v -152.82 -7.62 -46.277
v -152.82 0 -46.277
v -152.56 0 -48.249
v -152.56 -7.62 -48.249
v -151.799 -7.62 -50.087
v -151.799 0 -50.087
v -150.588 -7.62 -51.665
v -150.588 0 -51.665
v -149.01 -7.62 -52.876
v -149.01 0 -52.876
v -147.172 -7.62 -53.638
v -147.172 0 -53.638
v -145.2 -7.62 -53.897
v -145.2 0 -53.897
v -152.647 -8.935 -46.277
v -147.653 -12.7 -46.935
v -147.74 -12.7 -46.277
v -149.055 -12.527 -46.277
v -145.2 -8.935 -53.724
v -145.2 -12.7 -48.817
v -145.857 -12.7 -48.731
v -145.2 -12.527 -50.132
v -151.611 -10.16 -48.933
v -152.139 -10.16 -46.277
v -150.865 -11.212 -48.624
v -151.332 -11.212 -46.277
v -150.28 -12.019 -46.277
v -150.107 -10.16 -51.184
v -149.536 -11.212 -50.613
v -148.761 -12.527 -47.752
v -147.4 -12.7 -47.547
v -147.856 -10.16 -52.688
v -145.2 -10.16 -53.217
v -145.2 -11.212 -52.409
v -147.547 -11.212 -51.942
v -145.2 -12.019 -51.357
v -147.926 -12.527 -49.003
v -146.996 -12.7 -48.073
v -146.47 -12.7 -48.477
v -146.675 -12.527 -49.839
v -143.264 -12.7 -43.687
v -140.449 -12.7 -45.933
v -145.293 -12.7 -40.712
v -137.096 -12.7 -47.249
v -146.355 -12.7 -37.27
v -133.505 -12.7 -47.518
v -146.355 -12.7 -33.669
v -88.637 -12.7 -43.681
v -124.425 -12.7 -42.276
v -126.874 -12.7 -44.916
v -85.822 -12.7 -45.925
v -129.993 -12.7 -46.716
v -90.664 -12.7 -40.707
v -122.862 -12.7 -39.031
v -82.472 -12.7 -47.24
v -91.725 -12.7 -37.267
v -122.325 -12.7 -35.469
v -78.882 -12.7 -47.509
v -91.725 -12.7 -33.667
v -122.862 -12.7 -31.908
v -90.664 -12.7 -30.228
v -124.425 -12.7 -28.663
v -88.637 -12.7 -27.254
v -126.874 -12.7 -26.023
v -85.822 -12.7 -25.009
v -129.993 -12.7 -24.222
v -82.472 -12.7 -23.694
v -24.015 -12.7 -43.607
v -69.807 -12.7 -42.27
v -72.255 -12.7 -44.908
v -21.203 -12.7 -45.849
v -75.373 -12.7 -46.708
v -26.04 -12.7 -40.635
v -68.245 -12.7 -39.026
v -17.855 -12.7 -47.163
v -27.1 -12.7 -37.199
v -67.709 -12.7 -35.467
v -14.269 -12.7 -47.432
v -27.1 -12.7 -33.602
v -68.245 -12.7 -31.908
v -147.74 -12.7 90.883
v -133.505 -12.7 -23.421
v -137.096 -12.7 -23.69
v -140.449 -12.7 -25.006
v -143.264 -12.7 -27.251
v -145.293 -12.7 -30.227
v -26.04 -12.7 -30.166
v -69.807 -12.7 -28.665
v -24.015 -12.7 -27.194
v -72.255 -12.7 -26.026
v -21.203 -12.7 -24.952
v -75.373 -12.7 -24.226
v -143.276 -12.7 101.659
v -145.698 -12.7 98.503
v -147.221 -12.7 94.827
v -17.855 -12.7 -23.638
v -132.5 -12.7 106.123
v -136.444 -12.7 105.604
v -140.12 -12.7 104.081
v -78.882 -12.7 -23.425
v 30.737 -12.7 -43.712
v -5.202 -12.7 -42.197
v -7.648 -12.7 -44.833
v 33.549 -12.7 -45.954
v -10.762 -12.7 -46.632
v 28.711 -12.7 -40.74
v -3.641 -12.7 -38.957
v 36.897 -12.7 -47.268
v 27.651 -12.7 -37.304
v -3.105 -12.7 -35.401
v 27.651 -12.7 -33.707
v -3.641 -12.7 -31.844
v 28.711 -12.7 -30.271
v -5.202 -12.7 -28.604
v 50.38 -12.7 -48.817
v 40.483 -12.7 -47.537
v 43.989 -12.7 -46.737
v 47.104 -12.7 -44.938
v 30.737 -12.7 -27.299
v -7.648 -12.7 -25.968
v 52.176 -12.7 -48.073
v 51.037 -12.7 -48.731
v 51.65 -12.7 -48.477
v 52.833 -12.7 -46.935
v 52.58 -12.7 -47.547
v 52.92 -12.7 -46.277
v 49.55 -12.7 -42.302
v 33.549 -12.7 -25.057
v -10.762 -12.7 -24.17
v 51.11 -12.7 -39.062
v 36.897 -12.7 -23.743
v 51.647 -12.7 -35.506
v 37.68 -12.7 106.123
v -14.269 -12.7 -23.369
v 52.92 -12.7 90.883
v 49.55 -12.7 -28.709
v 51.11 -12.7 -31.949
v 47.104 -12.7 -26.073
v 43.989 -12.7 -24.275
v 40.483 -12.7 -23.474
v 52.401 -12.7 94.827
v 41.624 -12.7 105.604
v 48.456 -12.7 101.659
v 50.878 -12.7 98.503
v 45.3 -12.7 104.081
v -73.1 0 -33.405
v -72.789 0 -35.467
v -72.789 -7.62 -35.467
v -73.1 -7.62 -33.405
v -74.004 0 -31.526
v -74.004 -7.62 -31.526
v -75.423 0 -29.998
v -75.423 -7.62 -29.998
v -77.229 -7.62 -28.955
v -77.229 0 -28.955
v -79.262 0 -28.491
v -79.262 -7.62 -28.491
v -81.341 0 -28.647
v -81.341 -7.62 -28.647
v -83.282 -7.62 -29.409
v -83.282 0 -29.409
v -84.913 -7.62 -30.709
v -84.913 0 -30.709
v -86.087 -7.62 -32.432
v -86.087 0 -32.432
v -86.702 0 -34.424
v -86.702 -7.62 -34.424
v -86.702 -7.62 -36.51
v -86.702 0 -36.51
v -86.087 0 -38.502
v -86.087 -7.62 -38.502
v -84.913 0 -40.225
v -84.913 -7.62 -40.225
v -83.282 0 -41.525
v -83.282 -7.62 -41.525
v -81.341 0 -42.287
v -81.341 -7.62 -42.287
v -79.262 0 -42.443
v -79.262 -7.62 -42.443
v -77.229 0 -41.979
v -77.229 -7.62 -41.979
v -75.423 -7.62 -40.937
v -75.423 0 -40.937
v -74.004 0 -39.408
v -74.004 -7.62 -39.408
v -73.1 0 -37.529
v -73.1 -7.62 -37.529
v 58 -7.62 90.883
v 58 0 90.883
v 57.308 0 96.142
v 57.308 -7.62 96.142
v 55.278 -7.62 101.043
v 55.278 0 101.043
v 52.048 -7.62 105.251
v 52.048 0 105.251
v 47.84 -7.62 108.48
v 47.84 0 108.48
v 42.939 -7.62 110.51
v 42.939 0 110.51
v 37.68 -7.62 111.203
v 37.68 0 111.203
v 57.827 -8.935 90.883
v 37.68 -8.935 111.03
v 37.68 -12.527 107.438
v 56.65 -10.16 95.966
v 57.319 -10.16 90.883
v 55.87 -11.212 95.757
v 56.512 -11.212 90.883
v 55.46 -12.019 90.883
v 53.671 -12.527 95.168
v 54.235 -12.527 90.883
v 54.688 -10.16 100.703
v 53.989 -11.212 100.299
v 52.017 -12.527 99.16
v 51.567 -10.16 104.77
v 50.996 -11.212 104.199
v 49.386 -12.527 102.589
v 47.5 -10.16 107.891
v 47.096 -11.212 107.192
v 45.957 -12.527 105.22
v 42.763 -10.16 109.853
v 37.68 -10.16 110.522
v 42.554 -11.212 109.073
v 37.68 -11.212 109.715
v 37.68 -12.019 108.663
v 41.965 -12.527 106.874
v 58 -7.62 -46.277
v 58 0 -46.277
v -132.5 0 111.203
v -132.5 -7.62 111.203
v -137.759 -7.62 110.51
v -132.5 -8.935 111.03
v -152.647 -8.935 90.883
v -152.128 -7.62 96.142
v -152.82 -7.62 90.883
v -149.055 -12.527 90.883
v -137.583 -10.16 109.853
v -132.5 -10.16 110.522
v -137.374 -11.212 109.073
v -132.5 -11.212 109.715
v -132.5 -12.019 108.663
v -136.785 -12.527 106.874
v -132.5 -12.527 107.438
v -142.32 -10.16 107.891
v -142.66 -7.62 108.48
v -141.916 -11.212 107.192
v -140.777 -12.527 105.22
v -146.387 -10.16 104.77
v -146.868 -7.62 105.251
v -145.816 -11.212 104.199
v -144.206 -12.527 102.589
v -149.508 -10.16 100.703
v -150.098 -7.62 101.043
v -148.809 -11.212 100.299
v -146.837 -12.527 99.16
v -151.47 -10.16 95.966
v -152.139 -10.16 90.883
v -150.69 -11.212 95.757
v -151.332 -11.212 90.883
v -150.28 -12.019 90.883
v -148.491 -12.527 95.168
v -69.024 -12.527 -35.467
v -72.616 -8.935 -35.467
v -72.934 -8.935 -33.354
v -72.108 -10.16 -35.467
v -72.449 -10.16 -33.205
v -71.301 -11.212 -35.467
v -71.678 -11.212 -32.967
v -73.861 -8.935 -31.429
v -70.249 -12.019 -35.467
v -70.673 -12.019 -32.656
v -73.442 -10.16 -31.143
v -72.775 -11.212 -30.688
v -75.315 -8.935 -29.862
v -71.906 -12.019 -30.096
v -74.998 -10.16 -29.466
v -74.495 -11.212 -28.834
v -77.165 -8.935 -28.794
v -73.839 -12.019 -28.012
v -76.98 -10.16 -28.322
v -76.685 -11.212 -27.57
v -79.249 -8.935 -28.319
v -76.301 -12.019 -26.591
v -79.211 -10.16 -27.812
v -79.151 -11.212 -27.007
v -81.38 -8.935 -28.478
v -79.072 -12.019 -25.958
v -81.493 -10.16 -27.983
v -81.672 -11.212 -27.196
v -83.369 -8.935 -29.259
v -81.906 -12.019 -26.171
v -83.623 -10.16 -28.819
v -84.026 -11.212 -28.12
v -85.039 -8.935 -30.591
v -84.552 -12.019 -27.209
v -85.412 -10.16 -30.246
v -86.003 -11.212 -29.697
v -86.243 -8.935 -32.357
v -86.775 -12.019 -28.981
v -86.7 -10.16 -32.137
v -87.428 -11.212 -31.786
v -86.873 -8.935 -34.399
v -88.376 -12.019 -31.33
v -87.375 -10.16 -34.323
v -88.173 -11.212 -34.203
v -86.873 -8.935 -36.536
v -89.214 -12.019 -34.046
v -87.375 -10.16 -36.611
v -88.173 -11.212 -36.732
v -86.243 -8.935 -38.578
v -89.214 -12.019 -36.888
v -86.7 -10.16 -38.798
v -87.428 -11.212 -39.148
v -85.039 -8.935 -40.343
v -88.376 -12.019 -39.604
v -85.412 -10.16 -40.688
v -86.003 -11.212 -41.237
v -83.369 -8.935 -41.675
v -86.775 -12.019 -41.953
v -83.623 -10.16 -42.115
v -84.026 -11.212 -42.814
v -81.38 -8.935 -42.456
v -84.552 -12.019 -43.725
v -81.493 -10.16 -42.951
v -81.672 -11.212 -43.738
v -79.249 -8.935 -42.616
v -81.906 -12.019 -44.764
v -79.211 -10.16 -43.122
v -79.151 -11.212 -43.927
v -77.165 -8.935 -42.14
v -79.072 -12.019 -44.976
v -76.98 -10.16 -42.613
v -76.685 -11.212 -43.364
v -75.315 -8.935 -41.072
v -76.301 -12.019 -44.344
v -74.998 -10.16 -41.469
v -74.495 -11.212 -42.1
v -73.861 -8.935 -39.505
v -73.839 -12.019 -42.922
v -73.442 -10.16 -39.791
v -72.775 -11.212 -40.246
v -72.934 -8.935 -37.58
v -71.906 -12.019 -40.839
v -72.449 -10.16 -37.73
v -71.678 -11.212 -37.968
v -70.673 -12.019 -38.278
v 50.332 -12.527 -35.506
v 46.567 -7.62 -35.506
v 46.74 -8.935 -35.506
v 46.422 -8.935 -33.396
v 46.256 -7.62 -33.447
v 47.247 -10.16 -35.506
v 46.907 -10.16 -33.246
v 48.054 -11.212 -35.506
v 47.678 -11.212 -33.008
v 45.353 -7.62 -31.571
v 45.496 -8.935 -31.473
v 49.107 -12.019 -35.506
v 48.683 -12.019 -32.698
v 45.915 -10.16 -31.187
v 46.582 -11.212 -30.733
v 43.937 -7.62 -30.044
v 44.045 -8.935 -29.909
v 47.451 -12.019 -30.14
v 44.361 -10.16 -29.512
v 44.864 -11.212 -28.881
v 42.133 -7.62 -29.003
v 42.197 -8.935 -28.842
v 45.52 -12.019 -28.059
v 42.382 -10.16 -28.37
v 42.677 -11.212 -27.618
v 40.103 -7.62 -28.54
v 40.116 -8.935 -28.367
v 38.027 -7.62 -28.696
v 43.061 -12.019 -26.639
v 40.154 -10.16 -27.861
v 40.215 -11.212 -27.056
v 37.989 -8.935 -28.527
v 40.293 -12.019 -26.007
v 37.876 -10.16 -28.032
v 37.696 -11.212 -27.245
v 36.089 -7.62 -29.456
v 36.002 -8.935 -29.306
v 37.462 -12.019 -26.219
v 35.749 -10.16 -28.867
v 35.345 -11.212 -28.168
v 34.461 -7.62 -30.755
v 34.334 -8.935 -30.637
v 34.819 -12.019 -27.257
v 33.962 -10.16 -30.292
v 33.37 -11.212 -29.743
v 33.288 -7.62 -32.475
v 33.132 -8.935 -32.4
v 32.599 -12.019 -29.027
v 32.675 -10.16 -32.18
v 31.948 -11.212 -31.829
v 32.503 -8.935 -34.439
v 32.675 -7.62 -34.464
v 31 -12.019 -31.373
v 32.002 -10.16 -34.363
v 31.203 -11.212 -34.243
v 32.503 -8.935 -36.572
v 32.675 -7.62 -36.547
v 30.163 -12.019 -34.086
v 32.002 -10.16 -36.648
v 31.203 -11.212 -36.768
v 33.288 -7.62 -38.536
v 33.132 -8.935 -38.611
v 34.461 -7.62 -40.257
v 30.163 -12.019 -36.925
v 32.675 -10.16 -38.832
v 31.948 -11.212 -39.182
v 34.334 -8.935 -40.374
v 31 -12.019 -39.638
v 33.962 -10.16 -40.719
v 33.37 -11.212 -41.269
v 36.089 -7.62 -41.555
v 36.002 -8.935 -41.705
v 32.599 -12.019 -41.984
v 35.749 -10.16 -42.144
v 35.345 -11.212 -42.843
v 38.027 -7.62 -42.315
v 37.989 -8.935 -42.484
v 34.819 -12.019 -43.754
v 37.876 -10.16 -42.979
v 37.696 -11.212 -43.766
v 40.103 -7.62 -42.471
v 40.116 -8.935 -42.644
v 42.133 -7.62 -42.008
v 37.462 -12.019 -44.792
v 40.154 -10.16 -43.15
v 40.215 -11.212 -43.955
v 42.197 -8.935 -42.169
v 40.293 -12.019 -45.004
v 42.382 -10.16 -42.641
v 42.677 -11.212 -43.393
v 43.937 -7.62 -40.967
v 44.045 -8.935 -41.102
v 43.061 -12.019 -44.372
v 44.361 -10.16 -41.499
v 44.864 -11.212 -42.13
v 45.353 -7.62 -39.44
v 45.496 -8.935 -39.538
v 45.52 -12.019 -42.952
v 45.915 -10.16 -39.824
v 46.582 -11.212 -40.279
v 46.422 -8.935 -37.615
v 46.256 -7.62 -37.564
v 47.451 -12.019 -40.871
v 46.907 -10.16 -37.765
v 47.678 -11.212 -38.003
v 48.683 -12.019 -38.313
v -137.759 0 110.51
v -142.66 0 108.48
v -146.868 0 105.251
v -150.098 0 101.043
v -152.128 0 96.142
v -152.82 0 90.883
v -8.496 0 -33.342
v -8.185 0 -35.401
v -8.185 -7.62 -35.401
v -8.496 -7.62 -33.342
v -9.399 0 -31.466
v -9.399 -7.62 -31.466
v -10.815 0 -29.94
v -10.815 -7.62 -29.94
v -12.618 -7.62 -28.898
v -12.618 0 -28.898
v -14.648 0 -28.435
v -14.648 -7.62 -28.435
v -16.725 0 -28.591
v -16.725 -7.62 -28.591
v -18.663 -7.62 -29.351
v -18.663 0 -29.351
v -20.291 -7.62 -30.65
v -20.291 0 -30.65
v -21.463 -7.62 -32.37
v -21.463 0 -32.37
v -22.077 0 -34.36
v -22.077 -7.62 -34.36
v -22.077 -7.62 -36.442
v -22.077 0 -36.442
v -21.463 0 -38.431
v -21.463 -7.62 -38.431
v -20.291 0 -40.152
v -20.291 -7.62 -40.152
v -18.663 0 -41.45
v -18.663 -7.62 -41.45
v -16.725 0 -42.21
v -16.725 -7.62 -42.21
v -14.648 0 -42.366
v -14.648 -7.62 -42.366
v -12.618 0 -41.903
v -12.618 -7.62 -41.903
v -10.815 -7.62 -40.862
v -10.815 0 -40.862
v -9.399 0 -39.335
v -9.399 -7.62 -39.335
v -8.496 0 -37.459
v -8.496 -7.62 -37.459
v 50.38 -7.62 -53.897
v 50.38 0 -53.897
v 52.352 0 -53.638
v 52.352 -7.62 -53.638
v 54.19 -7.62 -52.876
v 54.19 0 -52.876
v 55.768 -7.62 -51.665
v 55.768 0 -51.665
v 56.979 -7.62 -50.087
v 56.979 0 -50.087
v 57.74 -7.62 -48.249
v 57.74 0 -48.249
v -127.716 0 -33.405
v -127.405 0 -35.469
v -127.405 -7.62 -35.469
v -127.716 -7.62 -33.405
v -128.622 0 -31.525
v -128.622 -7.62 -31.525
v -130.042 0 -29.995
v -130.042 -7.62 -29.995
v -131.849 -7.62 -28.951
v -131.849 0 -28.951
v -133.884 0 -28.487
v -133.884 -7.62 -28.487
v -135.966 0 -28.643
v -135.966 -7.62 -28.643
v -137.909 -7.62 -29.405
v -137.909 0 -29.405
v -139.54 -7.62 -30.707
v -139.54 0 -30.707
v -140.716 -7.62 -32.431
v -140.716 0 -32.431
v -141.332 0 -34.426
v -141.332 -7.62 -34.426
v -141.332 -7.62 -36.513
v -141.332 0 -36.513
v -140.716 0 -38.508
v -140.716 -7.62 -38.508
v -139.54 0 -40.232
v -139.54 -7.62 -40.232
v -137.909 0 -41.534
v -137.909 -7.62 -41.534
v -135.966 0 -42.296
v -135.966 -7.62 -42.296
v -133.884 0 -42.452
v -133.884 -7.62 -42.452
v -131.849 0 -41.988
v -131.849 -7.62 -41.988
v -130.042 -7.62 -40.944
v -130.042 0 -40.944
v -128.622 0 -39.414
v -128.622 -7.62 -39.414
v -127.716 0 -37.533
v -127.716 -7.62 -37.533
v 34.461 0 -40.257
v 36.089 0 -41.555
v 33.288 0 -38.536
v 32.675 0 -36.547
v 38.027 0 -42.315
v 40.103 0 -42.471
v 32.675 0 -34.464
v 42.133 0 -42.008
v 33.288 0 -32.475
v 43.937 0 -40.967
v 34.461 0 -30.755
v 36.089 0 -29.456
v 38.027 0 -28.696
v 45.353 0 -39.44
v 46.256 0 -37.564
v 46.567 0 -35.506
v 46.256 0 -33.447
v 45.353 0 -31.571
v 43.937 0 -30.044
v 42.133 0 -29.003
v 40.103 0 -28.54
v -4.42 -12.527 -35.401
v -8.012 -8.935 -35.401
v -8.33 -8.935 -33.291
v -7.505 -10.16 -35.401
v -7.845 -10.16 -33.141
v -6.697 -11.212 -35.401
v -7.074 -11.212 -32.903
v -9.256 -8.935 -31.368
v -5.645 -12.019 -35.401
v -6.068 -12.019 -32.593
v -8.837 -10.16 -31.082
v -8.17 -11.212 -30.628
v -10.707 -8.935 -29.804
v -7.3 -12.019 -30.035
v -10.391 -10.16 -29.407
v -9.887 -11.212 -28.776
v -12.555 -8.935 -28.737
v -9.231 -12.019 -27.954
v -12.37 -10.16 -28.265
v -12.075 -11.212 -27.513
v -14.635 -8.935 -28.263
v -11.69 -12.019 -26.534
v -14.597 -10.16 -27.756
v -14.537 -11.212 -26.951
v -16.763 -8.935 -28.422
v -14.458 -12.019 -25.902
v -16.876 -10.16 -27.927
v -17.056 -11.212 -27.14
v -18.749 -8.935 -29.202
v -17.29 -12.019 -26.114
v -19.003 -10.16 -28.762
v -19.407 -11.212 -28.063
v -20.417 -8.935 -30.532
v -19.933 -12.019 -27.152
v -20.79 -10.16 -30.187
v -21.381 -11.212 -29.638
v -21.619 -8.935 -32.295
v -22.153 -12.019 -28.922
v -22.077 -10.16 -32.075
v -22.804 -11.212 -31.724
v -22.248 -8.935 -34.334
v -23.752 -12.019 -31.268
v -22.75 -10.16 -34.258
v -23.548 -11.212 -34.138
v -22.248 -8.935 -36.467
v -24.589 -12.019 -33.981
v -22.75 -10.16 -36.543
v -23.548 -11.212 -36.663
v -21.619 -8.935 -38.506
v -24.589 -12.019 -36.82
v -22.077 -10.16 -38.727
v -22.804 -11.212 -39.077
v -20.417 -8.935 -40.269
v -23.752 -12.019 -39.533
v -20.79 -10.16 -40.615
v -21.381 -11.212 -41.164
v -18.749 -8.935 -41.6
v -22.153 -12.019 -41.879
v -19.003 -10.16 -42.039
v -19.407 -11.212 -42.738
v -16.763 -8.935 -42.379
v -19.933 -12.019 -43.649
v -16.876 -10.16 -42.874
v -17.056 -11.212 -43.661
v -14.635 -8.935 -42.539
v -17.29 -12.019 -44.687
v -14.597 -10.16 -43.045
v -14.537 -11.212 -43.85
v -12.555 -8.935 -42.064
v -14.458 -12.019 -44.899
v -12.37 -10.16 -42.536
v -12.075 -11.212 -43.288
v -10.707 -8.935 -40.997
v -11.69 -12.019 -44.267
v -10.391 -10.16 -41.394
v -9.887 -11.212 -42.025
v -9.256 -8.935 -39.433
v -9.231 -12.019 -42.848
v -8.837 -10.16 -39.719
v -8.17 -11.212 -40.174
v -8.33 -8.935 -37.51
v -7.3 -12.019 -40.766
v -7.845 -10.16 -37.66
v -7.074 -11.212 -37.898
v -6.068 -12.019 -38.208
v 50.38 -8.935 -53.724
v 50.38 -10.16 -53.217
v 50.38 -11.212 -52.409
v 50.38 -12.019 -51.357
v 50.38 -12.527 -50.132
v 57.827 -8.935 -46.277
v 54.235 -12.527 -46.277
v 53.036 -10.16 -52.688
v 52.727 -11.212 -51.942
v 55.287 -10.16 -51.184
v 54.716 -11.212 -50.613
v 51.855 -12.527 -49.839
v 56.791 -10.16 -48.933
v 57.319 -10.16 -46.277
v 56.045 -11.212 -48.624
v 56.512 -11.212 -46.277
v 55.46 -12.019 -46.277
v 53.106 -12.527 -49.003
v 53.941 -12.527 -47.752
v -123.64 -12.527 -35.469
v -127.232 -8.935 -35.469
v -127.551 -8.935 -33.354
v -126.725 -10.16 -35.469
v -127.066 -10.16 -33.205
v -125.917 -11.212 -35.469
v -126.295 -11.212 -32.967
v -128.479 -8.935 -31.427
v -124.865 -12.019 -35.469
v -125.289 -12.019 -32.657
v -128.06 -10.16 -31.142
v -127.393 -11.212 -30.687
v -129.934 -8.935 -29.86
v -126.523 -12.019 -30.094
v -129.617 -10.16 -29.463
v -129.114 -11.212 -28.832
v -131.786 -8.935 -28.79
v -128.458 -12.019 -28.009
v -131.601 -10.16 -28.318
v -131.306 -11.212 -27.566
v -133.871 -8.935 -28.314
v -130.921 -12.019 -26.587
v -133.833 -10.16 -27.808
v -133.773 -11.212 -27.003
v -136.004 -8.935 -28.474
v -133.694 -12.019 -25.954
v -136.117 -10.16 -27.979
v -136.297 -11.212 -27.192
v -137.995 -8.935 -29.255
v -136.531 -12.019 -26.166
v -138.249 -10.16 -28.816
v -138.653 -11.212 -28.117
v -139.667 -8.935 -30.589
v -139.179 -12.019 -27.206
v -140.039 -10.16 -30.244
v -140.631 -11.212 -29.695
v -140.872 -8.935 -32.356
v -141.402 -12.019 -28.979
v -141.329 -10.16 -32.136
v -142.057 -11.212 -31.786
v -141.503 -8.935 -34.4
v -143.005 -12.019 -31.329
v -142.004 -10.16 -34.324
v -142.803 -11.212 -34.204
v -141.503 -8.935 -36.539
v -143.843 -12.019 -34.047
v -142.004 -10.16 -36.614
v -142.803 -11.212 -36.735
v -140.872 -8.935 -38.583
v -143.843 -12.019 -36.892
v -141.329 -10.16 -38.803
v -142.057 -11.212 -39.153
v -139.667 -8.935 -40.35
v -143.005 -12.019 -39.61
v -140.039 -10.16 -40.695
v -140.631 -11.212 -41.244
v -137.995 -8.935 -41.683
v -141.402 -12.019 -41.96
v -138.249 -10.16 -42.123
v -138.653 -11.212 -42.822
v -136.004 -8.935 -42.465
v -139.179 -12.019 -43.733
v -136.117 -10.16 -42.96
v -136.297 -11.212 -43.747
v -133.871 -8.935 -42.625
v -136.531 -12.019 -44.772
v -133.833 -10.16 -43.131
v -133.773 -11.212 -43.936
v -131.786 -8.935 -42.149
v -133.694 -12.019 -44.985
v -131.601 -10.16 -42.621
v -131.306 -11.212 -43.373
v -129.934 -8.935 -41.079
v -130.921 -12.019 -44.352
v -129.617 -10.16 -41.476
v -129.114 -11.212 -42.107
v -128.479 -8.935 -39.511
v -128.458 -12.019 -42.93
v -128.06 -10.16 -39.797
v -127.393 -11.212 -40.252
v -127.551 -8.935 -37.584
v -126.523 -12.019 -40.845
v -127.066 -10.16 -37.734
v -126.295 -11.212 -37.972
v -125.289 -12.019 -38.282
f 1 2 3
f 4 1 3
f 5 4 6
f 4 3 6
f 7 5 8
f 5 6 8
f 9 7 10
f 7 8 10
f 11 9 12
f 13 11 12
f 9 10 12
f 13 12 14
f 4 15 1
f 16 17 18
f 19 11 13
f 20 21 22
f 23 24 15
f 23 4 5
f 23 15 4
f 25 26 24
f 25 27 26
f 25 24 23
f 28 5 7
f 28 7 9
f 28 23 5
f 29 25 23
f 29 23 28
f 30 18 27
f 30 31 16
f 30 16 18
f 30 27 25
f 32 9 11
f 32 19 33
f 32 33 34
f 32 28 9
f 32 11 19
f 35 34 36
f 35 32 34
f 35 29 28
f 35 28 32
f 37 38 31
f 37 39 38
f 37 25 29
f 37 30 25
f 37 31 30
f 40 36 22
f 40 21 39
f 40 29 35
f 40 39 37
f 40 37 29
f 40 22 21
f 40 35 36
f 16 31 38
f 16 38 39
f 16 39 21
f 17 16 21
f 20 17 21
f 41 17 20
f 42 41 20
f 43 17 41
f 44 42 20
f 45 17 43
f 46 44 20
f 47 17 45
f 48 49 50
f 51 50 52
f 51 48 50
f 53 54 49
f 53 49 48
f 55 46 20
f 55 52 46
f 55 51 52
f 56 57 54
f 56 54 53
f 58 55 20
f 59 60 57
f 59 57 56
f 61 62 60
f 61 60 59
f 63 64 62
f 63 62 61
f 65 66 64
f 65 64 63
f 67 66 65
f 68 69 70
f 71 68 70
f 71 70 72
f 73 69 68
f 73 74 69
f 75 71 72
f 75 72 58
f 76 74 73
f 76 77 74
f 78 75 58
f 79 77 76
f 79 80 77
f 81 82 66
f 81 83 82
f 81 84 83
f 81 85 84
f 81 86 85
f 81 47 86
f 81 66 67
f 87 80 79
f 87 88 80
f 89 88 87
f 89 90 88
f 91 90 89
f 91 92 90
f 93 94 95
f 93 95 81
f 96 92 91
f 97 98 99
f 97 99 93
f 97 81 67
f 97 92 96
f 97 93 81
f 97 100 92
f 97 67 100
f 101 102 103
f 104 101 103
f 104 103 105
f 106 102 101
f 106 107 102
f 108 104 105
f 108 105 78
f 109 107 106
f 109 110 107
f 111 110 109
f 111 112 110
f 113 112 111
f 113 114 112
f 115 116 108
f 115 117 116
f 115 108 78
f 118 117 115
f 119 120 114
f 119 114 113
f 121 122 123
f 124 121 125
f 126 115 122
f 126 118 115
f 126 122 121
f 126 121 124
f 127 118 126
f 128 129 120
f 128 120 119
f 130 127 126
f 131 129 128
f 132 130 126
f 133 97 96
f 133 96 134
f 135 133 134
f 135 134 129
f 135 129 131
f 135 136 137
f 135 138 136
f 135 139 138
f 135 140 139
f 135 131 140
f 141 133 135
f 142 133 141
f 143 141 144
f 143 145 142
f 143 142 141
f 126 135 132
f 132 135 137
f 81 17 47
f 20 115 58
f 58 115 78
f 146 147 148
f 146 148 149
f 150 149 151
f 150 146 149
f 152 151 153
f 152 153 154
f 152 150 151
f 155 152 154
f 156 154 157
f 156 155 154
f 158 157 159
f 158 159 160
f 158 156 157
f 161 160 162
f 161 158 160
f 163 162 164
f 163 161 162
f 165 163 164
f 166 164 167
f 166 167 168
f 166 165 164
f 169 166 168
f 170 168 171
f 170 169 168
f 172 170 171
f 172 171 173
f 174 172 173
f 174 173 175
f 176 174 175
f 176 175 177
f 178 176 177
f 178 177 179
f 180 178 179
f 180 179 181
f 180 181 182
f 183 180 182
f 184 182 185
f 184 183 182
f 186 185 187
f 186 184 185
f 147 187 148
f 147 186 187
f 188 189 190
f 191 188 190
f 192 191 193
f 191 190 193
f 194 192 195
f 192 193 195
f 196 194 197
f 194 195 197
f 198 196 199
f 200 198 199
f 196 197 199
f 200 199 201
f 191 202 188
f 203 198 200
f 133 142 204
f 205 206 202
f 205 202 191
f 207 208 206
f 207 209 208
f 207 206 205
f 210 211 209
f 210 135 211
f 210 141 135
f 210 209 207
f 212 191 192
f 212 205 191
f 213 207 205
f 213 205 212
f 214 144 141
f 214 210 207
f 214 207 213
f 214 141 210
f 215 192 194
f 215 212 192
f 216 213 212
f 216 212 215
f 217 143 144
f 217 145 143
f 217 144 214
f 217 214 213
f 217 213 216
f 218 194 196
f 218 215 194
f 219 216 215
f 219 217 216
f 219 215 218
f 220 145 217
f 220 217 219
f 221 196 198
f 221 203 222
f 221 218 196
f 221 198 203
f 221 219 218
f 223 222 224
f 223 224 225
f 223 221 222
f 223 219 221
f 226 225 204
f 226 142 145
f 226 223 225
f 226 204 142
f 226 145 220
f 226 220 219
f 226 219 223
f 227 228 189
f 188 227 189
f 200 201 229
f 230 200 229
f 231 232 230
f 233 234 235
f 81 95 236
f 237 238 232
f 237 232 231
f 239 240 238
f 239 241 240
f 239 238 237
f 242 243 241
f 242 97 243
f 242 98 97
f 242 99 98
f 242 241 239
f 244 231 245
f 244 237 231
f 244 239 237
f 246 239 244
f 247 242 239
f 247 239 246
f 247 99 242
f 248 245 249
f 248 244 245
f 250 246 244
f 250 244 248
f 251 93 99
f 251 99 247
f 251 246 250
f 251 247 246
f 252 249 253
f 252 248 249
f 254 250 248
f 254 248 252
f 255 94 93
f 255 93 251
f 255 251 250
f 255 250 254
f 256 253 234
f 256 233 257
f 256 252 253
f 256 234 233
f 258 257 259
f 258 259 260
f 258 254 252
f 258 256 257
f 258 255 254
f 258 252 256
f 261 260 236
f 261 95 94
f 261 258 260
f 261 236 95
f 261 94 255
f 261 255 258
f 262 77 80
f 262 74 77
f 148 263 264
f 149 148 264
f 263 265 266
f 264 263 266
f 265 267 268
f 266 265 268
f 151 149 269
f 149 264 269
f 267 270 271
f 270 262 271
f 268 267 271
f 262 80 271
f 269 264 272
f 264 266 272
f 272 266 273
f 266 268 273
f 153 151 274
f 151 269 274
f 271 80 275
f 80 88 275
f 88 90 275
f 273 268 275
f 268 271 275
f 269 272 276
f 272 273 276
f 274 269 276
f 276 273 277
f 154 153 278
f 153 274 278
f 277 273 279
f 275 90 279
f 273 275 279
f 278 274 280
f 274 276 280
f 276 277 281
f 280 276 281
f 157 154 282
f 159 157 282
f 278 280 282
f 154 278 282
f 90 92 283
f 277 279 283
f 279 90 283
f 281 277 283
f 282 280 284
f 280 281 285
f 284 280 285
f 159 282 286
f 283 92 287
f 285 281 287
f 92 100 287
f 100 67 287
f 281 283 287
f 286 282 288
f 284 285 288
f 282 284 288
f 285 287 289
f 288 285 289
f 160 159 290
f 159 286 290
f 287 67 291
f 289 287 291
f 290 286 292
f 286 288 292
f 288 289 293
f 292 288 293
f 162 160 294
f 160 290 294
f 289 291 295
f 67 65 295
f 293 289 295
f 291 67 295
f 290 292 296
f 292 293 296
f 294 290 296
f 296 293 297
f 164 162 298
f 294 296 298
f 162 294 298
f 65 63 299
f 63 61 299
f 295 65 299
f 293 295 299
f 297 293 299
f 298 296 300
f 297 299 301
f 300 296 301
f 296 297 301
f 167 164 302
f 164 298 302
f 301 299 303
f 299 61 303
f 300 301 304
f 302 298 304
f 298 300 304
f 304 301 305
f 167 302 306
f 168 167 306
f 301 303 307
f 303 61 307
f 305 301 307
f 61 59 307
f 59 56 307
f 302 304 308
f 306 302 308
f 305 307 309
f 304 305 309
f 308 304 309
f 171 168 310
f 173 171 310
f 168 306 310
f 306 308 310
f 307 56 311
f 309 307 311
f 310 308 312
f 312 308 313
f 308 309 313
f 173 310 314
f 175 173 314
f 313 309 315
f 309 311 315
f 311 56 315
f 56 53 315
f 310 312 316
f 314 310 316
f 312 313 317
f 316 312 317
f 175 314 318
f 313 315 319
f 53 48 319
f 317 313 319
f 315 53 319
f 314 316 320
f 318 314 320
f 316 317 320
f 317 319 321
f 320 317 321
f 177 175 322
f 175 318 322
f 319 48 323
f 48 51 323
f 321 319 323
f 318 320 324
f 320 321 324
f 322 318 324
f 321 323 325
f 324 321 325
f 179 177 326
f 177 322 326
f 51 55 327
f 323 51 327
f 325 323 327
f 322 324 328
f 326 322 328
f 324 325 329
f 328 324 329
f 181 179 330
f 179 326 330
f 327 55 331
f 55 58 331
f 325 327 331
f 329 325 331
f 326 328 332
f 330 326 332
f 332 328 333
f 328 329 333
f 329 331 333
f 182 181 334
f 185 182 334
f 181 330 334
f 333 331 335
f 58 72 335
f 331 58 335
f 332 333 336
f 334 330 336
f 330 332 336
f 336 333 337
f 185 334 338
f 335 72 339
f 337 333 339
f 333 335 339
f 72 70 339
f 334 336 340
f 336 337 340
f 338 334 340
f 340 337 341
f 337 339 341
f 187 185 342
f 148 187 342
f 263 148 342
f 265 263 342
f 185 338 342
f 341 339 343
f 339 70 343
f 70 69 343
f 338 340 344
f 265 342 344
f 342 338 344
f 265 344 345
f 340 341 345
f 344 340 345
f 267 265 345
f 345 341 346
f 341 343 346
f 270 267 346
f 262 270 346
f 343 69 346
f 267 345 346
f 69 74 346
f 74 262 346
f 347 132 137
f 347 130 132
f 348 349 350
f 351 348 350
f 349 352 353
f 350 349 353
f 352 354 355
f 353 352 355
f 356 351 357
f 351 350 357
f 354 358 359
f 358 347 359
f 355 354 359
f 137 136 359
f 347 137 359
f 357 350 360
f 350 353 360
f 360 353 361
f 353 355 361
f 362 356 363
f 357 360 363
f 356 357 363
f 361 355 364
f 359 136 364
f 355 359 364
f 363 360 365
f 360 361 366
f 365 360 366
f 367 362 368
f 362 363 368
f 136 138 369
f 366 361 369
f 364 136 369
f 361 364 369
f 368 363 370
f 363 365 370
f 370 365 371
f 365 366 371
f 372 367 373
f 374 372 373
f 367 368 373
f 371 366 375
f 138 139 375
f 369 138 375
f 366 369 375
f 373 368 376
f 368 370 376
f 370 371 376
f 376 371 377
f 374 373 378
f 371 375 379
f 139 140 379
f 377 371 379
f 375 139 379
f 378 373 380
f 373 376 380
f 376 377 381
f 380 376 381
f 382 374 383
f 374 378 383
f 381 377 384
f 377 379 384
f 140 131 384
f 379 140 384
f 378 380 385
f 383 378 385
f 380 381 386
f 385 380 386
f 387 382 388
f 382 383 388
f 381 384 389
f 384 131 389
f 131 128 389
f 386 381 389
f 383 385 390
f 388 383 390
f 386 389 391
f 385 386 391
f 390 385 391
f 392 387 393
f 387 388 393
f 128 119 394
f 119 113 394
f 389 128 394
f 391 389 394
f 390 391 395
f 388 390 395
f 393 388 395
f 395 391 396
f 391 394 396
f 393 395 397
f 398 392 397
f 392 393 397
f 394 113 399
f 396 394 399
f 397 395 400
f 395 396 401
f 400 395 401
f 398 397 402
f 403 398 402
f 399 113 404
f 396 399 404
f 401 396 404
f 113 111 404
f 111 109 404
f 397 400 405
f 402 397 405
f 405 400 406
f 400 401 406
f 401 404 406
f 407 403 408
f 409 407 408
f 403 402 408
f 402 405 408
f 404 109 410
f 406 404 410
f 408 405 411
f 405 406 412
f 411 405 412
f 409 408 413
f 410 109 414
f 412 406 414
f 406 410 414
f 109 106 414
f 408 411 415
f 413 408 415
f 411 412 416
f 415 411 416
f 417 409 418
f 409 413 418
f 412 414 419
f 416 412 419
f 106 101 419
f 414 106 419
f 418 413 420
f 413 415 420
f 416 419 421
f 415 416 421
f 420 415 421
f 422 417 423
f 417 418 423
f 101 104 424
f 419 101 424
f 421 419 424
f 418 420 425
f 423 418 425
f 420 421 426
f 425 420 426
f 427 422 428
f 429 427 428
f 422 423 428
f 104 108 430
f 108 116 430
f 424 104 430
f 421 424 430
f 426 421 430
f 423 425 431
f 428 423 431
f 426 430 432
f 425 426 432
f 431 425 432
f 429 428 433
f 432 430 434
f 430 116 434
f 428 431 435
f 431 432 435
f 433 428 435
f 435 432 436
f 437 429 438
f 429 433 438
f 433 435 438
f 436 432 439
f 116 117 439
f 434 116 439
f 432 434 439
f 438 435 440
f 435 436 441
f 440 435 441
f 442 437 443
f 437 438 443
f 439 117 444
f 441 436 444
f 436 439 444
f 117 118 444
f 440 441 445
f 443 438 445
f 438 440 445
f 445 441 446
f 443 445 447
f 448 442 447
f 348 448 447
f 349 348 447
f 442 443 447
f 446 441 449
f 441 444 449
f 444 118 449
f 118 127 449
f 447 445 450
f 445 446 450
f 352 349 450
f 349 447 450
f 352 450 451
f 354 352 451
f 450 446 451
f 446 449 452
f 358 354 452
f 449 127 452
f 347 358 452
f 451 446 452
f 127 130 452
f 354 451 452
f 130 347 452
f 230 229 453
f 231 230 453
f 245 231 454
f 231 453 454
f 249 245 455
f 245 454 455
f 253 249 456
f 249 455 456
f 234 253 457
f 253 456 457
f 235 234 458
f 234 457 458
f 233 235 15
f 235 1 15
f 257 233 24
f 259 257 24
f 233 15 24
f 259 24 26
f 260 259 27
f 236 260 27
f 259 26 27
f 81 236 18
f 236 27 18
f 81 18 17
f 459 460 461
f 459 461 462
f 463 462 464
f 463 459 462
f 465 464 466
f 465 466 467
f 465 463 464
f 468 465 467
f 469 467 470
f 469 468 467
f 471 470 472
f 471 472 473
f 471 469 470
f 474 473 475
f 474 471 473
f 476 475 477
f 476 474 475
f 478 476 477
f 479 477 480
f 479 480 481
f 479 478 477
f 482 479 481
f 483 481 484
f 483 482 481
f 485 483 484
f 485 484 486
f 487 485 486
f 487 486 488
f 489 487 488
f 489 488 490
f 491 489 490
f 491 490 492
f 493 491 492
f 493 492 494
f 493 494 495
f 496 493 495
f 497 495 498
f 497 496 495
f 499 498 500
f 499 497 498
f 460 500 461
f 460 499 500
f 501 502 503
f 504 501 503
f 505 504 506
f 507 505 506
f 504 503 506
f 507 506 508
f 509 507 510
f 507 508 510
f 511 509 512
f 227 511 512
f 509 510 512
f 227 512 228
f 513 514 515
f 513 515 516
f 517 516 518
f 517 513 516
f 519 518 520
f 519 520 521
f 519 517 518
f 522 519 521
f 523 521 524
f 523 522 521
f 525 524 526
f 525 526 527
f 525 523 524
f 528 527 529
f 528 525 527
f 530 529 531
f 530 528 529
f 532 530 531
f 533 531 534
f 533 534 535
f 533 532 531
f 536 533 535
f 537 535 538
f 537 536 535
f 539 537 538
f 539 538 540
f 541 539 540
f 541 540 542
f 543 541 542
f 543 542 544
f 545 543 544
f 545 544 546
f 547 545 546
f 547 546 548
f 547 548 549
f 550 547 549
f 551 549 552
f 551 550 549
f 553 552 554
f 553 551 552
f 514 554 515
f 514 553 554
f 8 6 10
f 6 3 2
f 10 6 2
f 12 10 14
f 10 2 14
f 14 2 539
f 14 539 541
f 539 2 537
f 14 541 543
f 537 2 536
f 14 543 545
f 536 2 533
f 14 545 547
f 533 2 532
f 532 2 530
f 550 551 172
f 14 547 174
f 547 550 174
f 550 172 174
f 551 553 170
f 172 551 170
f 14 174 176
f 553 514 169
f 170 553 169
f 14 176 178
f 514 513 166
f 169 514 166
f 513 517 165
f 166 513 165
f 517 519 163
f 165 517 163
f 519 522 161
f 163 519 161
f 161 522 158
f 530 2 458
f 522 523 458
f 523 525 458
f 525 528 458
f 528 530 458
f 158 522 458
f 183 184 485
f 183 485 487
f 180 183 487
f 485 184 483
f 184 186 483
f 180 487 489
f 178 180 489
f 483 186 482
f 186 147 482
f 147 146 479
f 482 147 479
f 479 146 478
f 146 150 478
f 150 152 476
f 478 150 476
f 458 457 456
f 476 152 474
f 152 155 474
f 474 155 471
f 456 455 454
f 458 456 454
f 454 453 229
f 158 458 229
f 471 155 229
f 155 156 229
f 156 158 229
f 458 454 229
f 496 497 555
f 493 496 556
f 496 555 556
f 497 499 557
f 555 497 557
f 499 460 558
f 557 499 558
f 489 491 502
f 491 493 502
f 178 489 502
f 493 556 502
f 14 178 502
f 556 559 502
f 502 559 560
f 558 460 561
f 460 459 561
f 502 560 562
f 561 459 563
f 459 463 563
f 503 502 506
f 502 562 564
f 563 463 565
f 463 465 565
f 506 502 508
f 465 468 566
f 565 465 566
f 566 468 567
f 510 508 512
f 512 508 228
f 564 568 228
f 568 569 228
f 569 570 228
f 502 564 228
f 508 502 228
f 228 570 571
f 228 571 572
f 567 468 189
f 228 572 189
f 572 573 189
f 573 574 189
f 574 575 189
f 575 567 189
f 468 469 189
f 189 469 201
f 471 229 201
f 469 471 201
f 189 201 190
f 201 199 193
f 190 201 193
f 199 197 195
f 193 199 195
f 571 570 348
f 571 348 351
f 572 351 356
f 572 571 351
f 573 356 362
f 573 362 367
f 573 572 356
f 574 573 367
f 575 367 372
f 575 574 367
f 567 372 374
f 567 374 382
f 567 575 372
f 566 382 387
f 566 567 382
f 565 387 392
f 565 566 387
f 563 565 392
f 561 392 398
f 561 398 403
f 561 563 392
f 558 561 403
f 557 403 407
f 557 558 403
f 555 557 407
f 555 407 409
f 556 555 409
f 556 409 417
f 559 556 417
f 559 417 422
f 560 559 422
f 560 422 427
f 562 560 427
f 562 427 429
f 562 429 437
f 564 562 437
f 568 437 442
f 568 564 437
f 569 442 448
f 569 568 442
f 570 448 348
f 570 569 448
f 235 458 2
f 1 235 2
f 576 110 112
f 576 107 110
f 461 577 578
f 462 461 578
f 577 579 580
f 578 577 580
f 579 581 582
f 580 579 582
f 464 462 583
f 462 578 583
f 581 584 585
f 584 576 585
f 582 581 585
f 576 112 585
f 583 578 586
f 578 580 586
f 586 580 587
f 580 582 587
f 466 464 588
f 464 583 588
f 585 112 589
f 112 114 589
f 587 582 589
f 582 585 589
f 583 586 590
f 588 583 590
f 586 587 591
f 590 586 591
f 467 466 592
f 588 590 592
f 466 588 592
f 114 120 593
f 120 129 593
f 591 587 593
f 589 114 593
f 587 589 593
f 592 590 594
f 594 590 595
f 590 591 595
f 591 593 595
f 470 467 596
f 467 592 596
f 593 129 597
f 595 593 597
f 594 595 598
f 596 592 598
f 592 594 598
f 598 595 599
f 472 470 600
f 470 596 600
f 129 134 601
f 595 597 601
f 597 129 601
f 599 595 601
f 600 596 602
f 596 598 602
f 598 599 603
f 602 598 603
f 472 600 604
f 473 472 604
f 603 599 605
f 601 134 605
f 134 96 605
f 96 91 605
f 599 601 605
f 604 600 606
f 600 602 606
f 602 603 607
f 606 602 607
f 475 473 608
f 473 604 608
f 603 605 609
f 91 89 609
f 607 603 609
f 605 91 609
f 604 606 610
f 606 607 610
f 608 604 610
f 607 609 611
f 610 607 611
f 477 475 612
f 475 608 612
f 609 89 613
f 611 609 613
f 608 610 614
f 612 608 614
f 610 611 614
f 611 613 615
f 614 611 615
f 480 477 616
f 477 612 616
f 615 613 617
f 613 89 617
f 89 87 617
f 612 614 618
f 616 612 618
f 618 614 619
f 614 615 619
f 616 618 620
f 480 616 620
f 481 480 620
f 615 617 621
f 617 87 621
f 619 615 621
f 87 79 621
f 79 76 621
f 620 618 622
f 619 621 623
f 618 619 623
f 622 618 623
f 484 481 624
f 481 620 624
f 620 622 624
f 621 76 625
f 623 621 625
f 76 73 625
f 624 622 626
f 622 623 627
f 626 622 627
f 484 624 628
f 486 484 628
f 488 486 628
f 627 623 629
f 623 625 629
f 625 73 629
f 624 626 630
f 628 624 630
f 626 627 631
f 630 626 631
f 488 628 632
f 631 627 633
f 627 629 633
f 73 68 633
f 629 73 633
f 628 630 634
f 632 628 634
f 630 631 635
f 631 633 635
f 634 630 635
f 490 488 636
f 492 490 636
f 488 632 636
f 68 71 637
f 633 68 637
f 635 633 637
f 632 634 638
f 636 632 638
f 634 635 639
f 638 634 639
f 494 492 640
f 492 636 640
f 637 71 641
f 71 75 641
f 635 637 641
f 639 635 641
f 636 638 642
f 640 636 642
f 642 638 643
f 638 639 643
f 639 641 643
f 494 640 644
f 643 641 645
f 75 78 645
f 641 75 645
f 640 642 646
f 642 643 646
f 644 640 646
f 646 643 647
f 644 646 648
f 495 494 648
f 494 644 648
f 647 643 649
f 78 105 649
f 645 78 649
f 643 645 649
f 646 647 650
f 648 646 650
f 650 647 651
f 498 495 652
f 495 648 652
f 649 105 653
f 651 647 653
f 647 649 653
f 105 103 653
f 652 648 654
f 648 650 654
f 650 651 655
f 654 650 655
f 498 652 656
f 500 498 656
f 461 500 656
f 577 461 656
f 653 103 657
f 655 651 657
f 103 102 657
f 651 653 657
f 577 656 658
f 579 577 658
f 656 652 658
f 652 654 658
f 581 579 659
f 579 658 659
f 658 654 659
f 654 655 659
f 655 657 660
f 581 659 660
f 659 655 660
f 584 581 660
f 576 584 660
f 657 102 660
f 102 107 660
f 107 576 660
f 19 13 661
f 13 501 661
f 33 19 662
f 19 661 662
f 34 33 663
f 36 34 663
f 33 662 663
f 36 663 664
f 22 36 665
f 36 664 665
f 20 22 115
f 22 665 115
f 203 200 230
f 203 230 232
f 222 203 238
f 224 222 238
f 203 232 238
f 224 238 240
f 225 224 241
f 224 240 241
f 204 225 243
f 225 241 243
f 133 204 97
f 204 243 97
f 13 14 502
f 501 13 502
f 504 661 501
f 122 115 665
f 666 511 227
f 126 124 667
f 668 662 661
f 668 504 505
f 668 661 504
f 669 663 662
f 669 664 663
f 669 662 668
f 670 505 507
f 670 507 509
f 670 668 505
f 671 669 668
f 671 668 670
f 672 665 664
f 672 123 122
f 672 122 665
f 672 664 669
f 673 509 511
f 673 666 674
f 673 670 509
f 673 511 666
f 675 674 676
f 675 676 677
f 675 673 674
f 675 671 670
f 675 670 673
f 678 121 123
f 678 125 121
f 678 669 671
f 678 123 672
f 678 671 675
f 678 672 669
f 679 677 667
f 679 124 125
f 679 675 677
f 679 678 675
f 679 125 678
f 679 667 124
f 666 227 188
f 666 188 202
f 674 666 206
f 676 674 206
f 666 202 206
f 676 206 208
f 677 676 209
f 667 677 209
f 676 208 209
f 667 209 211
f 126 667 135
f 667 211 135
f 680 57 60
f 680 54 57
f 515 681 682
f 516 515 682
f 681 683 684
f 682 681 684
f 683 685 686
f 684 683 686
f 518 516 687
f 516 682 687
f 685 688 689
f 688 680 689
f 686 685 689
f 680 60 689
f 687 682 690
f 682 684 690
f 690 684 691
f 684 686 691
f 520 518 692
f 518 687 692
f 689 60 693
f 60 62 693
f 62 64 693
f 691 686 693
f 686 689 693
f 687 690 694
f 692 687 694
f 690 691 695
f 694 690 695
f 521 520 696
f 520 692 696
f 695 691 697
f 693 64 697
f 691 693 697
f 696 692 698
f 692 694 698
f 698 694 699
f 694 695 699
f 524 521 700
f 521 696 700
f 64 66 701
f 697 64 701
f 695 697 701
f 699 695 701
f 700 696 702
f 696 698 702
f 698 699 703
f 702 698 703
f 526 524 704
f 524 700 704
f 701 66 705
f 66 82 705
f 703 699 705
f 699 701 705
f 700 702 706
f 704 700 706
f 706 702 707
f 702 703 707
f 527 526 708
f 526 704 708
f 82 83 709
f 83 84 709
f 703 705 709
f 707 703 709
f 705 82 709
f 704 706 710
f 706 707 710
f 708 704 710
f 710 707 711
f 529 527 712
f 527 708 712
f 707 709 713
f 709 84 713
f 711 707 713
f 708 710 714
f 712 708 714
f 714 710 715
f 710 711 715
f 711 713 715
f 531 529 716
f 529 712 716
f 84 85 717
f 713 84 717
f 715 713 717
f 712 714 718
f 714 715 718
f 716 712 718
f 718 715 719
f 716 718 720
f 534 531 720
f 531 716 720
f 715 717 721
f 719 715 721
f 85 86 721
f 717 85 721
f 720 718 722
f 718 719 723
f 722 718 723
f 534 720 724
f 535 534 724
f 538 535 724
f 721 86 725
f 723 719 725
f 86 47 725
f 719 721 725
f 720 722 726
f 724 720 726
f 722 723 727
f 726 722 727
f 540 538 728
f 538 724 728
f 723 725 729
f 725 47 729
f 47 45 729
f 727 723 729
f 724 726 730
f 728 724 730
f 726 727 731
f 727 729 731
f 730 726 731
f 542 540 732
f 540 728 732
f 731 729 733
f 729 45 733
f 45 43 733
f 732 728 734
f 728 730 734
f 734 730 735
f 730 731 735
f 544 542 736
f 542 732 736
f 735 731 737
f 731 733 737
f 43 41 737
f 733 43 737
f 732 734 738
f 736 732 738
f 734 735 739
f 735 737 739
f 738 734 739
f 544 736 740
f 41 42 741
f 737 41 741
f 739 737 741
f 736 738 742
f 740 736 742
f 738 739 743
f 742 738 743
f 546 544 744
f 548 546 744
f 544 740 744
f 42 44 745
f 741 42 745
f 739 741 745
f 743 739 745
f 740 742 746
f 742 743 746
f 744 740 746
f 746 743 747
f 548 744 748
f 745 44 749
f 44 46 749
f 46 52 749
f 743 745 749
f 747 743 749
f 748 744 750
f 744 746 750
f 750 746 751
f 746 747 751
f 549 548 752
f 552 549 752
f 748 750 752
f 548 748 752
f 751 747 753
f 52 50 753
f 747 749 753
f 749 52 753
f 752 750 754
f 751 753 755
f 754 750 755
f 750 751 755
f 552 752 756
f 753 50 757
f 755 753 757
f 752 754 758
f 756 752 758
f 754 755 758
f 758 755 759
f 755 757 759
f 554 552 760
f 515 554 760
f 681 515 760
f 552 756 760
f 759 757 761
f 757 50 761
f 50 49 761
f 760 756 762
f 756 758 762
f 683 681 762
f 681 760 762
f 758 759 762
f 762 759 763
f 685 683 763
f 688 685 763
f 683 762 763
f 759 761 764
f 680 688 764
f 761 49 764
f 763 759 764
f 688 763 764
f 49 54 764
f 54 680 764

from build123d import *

# Parameters (mm, degrees)
F0_R     = 7.002224
F0_R_2   = 6.995584
F0_R_3   = 6.985
F1_DEPTH = 12.7
F2_R     = 5.08


with BuildPart() as f1:
    # F0 (on Front) → F1 (new body)
    with BuildSketch(Plane.XZ):
        with BuildLine():
            Line((37.680028, 111.202829), (-132.499972, 111.202829))
            ThreePointArc((-132.499972, 111.202829), (-146.868382, 105.251239), (-152.819972, 90.882829))
            Line((-152.819972, 90.882829), (-152.819972, -46.277171))
            ThreePointArc((-152.819972, -46.277171), (-150.588126, -51.665325), (-145.199972, -53.897171))
            Line((-145.199972, -53.897171), (-55.029972, -53.897171))
            Line((-55.029972, -53.897171), (-39.789972, -53.897171))
            Line((-39.789972, -53.897171), (50.380028, -53.897171))
            ThreePointArc((50.380028, -53.897171), (55.768182, -51.665325), (58.000028, -46.277171))
            Line((58.000028, -46.277171), (58.000028, 90.882829))
            ThreePointArc((58.000028, 90.882829), (52.048438, 105.251239), (37.680028, 111.202829))
        make_face()
        with Locations((-134.407488, -35.46943)):
            Circle(F0_R, mode=Mode.SUBTRACT)
        with Locations((-79.784476, -35.467136)):
            Circle(F0_R_2, mode=Mode.SUBTRACT)
        with Locations((-15.170232, -35.400602)):
            Circle(F0_R_3, mode=Mode.SUBTRACT)
        with Locations((39.581503, -35.505551)):
            Circle(F0_R_3, mode=Mode.SUBTRACT)
    extrude(amount=F1_DEPTH)

    # F2
    f2_edges = [f1.edges().sort_by_distance(p)[0] for p in [
        (52.048438, -12.7, 105.251239),
        (-47.409972, -12.7, 111.202829),
        (-146.868382, -12.7, 105.251239),
        (-152.819972, -12.7, 22.302829),
        (-150.588126, -12.7, -51.665325),
        (-47.409972, -12.7, -53.897171),
        (55.768182, -12.7, -51.665325),
        (58.000028, -12.7, 22.302829),
        (-141.409712, -12.7, -35.46943),
        (-86.78006, -12.7, -35.467136),
        (-22.155232, -12.7, -35.400602),
        (32.596503, -12.7, -35.505551),
    ]]
    fillet(f2_edges, radius=F2_R)


solid = f1.part
